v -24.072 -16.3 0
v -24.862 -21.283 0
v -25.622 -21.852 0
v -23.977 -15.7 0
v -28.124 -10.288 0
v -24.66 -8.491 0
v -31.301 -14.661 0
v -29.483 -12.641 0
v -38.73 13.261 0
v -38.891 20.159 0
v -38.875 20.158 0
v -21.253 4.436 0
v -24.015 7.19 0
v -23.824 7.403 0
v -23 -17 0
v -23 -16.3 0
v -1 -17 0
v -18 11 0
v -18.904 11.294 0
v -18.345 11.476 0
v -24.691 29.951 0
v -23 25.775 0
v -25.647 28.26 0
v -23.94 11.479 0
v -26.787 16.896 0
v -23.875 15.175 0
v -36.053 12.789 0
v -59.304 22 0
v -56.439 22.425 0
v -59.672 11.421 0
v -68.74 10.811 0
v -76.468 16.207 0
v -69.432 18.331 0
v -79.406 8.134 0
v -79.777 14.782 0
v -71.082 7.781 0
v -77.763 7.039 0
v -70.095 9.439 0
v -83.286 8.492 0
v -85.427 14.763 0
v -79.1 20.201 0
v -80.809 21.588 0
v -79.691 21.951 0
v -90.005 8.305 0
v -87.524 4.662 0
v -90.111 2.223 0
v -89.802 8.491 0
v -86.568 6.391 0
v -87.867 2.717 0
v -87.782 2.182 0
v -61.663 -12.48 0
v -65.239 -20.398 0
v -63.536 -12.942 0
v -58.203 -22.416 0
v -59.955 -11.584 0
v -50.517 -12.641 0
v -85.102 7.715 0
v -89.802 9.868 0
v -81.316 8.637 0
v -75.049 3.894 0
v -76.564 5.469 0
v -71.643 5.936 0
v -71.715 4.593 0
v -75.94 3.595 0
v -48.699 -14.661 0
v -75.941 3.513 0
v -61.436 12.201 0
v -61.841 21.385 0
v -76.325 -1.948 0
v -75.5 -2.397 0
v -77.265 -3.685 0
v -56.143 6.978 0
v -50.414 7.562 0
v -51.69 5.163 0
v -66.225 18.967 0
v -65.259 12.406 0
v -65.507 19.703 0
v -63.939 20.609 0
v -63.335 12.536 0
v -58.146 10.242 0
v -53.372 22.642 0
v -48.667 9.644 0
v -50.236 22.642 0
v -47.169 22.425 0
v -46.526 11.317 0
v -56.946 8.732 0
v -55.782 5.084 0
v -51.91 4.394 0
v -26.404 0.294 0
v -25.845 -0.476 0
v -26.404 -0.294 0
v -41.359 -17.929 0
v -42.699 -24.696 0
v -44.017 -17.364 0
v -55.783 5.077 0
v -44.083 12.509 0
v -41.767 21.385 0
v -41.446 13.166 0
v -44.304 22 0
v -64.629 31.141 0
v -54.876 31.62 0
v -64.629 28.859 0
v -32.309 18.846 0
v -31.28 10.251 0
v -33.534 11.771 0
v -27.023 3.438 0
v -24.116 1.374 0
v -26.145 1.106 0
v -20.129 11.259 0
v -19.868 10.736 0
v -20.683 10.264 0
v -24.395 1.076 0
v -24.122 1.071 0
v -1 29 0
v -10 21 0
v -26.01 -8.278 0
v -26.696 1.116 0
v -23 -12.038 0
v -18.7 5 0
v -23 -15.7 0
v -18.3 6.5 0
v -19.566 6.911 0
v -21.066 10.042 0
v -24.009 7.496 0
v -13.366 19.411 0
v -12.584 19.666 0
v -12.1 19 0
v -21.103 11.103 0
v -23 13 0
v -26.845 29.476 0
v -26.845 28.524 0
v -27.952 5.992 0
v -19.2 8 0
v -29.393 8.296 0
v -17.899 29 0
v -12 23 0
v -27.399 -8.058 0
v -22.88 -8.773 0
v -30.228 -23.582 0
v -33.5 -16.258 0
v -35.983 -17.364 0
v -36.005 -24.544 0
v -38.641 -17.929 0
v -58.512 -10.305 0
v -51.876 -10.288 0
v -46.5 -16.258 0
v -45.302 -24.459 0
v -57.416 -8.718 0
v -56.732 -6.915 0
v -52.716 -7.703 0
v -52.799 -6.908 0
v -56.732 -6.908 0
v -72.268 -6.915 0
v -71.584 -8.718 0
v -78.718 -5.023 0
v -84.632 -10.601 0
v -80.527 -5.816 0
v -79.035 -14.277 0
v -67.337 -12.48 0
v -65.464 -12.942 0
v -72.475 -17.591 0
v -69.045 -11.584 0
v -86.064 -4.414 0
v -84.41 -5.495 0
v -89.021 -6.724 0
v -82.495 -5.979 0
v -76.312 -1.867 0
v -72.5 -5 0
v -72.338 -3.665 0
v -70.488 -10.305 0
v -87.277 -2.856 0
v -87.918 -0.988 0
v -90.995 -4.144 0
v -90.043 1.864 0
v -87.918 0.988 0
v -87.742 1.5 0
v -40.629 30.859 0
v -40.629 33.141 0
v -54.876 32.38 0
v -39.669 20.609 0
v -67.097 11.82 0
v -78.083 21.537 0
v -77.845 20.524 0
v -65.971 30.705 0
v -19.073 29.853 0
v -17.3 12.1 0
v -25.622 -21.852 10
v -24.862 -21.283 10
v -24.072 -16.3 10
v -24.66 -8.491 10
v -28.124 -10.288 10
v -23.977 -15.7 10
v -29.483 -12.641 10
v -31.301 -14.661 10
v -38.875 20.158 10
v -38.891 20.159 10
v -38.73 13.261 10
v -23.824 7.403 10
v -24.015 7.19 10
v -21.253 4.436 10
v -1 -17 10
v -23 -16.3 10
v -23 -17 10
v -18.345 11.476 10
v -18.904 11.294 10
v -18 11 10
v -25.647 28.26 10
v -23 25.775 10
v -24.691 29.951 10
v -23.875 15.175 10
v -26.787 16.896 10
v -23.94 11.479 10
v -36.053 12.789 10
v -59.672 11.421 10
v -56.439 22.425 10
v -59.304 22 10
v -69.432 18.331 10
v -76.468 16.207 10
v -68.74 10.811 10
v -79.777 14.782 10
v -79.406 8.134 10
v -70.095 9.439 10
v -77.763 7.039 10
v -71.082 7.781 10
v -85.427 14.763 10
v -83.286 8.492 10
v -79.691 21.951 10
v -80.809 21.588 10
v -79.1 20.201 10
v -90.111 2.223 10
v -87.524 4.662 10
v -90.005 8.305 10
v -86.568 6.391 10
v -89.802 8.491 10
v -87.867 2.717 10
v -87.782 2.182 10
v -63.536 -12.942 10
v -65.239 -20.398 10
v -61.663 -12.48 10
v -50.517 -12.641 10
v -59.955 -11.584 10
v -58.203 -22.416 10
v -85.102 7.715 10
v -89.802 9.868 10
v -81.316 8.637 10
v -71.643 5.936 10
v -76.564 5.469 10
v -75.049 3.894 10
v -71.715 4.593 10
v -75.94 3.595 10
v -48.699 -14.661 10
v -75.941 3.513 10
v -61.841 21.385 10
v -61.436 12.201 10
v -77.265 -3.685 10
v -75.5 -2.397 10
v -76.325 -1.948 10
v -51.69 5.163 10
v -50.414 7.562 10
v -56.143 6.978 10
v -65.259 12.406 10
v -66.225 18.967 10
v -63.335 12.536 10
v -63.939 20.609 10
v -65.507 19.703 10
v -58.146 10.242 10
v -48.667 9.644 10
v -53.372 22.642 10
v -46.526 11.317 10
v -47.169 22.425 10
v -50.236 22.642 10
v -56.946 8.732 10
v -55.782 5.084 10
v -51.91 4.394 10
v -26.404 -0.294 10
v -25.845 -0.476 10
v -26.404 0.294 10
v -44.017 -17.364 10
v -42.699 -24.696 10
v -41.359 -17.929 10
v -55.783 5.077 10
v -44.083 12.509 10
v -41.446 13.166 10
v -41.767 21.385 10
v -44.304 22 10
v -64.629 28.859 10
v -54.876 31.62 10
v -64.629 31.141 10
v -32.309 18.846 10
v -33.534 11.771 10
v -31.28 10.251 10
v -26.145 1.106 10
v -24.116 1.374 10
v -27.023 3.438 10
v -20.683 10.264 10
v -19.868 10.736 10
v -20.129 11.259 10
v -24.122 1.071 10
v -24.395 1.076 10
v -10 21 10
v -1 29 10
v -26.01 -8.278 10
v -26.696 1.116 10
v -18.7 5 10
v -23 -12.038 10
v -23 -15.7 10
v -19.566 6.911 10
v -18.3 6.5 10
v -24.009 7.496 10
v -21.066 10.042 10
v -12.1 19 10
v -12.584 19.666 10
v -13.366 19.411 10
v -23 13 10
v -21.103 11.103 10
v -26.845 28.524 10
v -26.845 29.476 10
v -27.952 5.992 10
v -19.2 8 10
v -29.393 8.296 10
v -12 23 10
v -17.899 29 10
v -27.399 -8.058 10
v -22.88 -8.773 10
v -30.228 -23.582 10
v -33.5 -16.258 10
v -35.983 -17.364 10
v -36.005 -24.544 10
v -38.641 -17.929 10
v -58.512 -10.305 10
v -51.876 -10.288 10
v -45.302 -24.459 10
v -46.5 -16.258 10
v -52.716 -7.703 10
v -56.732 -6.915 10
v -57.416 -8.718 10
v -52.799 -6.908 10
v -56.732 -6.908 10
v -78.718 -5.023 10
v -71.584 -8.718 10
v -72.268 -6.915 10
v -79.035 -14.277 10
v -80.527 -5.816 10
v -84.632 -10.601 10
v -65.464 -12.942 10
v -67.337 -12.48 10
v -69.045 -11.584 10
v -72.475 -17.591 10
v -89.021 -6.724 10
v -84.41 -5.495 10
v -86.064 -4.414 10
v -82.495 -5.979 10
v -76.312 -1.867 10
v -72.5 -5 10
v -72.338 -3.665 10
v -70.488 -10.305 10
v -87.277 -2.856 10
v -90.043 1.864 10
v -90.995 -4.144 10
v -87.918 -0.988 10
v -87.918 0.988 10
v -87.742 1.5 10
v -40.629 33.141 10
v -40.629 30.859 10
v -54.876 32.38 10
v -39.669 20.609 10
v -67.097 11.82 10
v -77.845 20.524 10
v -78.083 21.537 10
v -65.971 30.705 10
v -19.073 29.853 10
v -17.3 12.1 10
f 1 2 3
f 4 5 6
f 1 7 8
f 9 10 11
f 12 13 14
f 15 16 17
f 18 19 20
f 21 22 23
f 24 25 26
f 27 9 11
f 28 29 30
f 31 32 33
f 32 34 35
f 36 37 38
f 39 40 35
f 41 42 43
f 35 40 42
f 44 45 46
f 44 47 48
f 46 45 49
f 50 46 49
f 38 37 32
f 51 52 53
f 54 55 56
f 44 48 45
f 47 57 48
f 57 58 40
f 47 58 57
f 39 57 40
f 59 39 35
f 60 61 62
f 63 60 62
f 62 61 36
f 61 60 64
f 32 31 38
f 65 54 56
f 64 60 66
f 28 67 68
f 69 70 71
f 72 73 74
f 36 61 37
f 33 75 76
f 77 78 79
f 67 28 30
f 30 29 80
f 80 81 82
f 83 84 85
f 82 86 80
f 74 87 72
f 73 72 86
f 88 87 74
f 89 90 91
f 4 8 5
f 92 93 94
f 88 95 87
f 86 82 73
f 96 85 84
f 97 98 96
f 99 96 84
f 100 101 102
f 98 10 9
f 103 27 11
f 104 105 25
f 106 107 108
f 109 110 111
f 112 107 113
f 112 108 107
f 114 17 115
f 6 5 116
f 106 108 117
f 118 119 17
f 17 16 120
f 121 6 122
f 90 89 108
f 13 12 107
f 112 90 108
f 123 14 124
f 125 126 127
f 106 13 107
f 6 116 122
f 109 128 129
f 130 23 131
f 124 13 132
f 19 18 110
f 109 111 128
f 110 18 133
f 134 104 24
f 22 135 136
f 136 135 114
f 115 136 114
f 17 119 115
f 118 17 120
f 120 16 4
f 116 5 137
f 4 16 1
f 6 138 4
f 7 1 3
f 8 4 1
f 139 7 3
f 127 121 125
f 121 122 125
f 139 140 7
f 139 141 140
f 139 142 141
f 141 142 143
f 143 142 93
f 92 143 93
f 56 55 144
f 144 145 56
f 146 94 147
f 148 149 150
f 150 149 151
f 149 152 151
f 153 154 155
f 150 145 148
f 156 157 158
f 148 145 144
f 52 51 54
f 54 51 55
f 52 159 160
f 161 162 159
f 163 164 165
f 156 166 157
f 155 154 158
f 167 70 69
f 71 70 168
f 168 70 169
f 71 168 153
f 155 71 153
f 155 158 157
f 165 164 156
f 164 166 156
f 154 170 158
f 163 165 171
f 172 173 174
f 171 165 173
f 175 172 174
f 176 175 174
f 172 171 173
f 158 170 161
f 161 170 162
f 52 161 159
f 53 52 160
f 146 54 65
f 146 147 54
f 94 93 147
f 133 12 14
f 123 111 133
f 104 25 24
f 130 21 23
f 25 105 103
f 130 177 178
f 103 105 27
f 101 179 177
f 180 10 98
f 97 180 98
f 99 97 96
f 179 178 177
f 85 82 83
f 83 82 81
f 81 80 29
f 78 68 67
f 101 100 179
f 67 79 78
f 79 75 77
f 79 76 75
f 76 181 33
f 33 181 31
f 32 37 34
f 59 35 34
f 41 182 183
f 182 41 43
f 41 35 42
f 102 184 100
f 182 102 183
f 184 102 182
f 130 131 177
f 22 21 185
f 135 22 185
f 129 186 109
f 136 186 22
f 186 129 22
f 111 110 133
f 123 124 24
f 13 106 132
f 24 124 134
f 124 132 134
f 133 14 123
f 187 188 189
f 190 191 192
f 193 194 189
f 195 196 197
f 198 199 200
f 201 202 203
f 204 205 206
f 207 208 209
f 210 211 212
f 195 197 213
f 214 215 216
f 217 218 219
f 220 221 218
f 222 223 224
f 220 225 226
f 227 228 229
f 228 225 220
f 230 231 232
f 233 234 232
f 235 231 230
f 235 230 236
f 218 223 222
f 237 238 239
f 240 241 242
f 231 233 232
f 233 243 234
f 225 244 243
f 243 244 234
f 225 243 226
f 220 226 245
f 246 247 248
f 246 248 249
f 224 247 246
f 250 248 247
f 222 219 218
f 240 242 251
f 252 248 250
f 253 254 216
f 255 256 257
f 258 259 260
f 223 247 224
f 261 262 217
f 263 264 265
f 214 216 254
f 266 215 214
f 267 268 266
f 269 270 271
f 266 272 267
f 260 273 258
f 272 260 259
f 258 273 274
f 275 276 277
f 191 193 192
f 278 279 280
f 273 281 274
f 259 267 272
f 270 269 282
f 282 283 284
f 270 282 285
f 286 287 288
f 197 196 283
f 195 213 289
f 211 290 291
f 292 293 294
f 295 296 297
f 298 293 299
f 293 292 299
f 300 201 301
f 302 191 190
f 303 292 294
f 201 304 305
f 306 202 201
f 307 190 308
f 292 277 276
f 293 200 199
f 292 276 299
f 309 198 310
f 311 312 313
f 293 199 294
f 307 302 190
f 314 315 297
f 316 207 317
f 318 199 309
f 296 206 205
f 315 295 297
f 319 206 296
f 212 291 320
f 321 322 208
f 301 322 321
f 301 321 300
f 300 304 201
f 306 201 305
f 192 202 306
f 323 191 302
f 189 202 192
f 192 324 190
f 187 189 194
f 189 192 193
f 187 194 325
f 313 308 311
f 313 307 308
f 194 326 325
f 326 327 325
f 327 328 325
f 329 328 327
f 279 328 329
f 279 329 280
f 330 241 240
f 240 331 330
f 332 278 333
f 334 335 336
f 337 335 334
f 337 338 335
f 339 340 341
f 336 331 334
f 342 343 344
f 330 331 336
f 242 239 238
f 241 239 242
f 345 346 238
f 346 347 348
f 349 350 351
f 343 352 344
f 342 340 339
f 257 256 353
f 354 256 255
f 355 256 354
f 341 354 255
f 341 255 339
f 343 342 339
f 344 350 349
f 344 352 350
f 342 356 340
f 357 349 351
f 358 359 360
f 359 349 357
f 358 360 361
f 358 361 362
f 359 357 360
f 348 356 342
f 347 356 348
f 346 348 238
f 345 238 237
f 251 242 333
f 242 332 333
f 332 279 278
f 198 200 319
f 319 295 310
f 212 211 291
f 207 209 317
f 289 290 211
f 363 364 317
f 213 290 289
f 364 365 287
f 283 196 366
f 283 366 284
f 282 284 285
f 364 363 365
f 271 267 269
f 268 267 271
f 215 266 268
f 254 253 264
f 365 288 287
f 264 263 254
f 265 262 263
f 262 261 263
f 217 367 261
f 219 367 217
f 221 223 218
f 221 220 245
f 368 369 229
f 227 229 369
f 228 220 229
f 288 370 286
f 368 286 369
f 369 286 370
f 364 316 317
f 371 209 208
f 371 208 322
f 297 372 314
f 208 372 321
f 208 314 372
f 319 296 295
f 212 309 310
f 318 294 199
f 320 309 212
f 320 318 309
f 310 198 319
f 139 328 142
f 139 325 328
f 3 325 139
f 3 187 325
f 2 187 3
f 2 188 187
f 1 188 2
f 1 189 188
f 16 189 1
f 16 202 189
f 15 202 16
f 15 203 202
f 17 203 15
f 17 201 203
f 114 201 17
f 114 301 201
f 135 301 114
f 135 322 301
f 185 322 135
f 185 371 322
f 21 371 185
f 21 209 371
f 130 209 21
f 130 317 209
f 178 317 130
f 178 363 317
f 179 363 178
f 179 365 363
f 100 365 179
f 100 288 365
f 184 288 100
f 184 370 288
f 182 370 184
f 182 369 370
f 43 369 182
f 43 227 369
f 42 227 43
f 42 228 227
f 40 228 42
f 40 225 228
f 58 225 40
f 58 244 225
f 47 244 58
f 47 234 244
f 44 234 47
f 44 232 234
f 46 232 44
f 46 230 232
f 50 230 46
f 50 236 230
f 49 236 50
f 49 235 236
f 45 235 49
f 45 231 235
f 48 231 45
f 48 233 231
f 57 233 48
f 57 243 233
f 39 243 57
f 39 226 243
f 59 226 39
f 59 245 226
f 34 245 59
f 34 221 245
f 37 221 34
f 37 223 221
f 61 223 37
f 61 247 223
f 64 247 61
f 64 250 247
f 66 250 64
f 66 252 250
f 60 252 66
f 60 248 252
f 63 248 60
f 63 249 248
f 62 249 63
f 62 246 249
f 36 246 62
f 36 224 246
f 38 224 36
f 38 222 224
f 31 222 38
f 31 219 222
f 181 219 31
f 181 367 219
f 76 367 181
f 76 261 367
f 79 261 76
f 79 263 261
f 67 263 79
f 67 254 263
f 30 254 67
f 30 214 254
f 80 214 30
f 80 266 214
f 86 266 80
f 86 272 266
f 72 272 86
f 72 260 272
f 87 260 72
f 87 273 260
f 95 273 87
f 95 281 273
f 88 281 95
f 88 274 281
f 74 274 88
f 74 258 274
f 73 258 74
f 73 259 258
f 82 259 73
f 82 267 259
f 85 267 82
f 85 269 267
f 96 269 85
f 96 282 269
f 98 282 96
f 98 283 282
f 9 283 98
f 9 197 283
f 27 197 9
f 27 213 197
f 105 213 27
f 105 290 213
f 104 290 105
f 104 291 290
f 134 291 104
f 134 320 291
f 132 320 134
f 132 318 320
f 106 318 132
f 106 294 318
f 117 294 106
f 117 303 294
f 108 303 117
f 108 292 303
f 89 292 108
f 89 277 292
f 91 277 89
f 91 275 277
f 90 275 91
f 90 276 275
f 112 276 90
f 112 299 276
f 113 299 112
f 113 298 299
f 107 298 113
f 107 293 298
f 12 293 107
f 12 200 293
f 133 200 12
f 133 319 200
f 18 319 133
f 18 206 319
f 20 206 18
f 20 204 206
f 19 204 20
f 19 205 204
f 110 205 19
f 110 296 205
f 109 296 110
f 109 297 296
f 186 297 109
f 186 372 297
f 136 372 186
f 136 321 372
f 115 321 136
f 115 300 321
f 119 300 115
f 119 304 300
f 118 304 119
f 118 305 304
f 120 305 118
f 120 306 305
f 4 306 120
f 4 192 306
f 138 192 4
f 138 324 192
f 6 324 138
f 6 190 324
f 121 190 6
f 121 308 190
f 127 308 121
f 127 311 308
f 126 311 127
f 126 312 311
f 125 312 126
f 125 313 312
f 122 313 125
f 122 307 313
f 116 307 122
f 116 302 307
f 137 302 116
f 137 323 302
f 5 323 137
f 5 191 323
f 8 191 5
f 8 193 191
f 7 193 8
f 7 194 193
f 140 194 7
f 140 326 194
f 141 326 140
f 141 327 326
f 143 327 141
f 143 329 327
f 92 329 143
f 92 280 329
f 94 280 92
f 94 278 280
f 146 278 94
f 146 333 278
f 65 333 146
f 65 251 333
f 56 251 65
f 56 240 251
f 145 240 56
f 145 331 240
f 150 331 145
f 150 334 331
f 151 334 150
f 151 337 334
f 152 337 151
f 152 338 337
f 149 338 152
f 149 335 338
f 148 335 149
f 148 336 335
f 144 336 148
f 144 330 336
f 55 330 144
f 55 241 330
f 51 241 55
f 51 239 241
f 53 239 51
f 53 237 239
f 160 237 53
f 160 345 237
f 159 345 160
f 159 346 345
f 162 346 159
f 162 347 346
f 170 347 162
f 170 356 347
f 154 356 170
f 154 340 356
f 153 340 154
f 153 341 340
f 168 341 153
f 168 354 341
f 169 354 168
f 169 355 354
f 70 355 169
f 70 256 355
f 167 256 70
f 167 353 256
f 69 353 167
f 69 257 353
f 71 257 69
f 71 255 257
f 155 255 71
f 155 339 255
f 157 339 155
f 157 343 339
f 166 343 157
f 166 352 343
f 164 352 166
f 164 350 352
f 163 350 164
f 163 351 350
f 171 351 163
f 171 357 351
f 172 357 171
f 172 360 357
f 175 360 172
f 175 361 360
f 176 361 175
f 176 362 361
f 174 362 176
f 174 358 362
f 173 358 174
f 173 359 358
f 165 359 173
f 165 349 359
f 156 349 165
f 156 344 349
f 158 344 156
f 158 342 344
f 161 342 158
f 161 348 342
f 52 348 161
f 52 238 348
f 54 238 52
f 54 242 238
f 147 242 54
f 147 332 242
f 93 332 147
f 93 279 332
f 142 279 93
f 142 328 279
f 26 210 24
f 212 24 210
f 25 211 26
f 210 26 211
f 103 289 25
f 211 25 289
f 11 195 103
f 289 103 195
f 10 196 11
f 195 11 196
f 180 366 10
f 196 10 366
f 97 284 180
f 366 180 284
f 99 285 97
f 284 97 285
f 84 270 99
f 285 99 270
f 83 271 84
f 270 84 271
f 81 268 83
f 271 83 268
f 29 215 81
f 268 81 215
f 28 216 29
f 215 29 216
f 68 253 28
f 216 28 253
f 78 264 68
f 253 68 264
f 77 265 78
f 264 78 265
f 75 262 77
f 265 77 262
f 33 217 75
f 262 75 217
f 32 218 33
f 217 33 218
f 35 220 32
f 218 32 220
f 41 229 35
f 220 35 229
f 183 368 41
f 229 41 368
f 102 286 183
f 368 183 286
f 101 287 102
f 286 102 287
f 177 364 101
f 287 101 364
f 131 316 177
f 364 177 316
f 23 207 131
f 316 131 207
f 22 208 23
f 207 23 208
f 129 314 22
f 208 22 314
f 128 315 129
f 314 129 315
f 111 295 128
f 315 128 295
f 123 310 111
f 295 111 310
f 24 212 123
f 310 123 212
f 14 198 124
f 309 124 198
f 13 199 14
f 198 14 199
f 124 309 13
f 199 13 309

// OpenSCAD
*translate([-60,-5,0])scale([0.02,0.02,0.001 ])import("universalgrip2.stl");
//sphere(10);

A=[
[-88,9,2],
[-83,13,3],
[-80,21,1],
[-78,21,.5],
[-65,30,1.2],
[-55,32,.4],

[-41,32,1.2],
[-27,29,.5],
[-25,29,1],
[-20,27,3],
];
linear_extrude(10)union(){
 polyline(A);
              polyline([[-21,12,.5],[-20,10,.5],]);
              polyline([[-18.5,11,.5],[-21,8,1.8],[-22.5,6,2],[-26,0,.5],]);
              polyline([ [-21,8,1.8],[-25,10,1.8], ]);
              polyline([ [-26,-10,.7],[-19,6.5,.7],[-12.8,19,.7], ]);

 body();
lowjaw(0);
 translate([2,-8,0])mirror([0,1])
ujaw(10);
}
    
    module outake(){
        
        translate([-40,-5,0])circle(13);
        translate([-64.5,-5,0])circle(8);
        translate([-82,0,0])circle(6);
      
      
      
        translate([-56,28,0])scale([1.0,0.9])circle(39);
        }
        
        
        
       module lowjaw(r)
        { 
            
            
            
            translate([-22,-16]) 
                 rotate(r)   translate(-[-22,-16]) 
            
          intersection  (){
            difference(){
        translate([-22,-16])    
                     union(){
        rotate(-9)         rotate(180)     translate([2,-7])  square([68,19]);
                  square([5,0.6],center=true);
                }
            
            outake();
        }
        
    translate([-57,-6,0])rotate(-16)  scale([1.05,0.45])circle(36);
        }
            
            }
            
            
               
       module ujaw(r)
        { 
            
            
            translate([-22,-16]) 
                 rotate(r)   translate(-[-22,-16]) {
            translate([-55,-20]) rotate(-10)scale([1.5,0.5]) circle(10);
          intersection  (){
            difference(){
        translate([-22,-16])    
                     union(){
        rotate(-9)         rotate(180)     translate([4,-7])  square([66,19]);
                 }
            
            outake();
        }
        
    translate([-57,-6,0])rotate(-16)  scale([1.05,0.45])circle(36);
        }}
            
            }
            
     module body(){
         difference(){
         translate([-12,6])square([22,46],center= true);
         
         polygon([[-24,14],[-24,-16], [-18.7,5],[-10,21],[-12,23],[-17.3,12.1],[-21,11],]);
         }
         }       
            

module polyline(a){
    
    for (i=[0:len(a)-2])
        
    hull() {
    translate([a[i].x,a[i].y]) circle (a[i].z  );
    translate([a[i+1 ].x ,a[i+1].y])circle(a[i+1].z );
    
    }
    }
